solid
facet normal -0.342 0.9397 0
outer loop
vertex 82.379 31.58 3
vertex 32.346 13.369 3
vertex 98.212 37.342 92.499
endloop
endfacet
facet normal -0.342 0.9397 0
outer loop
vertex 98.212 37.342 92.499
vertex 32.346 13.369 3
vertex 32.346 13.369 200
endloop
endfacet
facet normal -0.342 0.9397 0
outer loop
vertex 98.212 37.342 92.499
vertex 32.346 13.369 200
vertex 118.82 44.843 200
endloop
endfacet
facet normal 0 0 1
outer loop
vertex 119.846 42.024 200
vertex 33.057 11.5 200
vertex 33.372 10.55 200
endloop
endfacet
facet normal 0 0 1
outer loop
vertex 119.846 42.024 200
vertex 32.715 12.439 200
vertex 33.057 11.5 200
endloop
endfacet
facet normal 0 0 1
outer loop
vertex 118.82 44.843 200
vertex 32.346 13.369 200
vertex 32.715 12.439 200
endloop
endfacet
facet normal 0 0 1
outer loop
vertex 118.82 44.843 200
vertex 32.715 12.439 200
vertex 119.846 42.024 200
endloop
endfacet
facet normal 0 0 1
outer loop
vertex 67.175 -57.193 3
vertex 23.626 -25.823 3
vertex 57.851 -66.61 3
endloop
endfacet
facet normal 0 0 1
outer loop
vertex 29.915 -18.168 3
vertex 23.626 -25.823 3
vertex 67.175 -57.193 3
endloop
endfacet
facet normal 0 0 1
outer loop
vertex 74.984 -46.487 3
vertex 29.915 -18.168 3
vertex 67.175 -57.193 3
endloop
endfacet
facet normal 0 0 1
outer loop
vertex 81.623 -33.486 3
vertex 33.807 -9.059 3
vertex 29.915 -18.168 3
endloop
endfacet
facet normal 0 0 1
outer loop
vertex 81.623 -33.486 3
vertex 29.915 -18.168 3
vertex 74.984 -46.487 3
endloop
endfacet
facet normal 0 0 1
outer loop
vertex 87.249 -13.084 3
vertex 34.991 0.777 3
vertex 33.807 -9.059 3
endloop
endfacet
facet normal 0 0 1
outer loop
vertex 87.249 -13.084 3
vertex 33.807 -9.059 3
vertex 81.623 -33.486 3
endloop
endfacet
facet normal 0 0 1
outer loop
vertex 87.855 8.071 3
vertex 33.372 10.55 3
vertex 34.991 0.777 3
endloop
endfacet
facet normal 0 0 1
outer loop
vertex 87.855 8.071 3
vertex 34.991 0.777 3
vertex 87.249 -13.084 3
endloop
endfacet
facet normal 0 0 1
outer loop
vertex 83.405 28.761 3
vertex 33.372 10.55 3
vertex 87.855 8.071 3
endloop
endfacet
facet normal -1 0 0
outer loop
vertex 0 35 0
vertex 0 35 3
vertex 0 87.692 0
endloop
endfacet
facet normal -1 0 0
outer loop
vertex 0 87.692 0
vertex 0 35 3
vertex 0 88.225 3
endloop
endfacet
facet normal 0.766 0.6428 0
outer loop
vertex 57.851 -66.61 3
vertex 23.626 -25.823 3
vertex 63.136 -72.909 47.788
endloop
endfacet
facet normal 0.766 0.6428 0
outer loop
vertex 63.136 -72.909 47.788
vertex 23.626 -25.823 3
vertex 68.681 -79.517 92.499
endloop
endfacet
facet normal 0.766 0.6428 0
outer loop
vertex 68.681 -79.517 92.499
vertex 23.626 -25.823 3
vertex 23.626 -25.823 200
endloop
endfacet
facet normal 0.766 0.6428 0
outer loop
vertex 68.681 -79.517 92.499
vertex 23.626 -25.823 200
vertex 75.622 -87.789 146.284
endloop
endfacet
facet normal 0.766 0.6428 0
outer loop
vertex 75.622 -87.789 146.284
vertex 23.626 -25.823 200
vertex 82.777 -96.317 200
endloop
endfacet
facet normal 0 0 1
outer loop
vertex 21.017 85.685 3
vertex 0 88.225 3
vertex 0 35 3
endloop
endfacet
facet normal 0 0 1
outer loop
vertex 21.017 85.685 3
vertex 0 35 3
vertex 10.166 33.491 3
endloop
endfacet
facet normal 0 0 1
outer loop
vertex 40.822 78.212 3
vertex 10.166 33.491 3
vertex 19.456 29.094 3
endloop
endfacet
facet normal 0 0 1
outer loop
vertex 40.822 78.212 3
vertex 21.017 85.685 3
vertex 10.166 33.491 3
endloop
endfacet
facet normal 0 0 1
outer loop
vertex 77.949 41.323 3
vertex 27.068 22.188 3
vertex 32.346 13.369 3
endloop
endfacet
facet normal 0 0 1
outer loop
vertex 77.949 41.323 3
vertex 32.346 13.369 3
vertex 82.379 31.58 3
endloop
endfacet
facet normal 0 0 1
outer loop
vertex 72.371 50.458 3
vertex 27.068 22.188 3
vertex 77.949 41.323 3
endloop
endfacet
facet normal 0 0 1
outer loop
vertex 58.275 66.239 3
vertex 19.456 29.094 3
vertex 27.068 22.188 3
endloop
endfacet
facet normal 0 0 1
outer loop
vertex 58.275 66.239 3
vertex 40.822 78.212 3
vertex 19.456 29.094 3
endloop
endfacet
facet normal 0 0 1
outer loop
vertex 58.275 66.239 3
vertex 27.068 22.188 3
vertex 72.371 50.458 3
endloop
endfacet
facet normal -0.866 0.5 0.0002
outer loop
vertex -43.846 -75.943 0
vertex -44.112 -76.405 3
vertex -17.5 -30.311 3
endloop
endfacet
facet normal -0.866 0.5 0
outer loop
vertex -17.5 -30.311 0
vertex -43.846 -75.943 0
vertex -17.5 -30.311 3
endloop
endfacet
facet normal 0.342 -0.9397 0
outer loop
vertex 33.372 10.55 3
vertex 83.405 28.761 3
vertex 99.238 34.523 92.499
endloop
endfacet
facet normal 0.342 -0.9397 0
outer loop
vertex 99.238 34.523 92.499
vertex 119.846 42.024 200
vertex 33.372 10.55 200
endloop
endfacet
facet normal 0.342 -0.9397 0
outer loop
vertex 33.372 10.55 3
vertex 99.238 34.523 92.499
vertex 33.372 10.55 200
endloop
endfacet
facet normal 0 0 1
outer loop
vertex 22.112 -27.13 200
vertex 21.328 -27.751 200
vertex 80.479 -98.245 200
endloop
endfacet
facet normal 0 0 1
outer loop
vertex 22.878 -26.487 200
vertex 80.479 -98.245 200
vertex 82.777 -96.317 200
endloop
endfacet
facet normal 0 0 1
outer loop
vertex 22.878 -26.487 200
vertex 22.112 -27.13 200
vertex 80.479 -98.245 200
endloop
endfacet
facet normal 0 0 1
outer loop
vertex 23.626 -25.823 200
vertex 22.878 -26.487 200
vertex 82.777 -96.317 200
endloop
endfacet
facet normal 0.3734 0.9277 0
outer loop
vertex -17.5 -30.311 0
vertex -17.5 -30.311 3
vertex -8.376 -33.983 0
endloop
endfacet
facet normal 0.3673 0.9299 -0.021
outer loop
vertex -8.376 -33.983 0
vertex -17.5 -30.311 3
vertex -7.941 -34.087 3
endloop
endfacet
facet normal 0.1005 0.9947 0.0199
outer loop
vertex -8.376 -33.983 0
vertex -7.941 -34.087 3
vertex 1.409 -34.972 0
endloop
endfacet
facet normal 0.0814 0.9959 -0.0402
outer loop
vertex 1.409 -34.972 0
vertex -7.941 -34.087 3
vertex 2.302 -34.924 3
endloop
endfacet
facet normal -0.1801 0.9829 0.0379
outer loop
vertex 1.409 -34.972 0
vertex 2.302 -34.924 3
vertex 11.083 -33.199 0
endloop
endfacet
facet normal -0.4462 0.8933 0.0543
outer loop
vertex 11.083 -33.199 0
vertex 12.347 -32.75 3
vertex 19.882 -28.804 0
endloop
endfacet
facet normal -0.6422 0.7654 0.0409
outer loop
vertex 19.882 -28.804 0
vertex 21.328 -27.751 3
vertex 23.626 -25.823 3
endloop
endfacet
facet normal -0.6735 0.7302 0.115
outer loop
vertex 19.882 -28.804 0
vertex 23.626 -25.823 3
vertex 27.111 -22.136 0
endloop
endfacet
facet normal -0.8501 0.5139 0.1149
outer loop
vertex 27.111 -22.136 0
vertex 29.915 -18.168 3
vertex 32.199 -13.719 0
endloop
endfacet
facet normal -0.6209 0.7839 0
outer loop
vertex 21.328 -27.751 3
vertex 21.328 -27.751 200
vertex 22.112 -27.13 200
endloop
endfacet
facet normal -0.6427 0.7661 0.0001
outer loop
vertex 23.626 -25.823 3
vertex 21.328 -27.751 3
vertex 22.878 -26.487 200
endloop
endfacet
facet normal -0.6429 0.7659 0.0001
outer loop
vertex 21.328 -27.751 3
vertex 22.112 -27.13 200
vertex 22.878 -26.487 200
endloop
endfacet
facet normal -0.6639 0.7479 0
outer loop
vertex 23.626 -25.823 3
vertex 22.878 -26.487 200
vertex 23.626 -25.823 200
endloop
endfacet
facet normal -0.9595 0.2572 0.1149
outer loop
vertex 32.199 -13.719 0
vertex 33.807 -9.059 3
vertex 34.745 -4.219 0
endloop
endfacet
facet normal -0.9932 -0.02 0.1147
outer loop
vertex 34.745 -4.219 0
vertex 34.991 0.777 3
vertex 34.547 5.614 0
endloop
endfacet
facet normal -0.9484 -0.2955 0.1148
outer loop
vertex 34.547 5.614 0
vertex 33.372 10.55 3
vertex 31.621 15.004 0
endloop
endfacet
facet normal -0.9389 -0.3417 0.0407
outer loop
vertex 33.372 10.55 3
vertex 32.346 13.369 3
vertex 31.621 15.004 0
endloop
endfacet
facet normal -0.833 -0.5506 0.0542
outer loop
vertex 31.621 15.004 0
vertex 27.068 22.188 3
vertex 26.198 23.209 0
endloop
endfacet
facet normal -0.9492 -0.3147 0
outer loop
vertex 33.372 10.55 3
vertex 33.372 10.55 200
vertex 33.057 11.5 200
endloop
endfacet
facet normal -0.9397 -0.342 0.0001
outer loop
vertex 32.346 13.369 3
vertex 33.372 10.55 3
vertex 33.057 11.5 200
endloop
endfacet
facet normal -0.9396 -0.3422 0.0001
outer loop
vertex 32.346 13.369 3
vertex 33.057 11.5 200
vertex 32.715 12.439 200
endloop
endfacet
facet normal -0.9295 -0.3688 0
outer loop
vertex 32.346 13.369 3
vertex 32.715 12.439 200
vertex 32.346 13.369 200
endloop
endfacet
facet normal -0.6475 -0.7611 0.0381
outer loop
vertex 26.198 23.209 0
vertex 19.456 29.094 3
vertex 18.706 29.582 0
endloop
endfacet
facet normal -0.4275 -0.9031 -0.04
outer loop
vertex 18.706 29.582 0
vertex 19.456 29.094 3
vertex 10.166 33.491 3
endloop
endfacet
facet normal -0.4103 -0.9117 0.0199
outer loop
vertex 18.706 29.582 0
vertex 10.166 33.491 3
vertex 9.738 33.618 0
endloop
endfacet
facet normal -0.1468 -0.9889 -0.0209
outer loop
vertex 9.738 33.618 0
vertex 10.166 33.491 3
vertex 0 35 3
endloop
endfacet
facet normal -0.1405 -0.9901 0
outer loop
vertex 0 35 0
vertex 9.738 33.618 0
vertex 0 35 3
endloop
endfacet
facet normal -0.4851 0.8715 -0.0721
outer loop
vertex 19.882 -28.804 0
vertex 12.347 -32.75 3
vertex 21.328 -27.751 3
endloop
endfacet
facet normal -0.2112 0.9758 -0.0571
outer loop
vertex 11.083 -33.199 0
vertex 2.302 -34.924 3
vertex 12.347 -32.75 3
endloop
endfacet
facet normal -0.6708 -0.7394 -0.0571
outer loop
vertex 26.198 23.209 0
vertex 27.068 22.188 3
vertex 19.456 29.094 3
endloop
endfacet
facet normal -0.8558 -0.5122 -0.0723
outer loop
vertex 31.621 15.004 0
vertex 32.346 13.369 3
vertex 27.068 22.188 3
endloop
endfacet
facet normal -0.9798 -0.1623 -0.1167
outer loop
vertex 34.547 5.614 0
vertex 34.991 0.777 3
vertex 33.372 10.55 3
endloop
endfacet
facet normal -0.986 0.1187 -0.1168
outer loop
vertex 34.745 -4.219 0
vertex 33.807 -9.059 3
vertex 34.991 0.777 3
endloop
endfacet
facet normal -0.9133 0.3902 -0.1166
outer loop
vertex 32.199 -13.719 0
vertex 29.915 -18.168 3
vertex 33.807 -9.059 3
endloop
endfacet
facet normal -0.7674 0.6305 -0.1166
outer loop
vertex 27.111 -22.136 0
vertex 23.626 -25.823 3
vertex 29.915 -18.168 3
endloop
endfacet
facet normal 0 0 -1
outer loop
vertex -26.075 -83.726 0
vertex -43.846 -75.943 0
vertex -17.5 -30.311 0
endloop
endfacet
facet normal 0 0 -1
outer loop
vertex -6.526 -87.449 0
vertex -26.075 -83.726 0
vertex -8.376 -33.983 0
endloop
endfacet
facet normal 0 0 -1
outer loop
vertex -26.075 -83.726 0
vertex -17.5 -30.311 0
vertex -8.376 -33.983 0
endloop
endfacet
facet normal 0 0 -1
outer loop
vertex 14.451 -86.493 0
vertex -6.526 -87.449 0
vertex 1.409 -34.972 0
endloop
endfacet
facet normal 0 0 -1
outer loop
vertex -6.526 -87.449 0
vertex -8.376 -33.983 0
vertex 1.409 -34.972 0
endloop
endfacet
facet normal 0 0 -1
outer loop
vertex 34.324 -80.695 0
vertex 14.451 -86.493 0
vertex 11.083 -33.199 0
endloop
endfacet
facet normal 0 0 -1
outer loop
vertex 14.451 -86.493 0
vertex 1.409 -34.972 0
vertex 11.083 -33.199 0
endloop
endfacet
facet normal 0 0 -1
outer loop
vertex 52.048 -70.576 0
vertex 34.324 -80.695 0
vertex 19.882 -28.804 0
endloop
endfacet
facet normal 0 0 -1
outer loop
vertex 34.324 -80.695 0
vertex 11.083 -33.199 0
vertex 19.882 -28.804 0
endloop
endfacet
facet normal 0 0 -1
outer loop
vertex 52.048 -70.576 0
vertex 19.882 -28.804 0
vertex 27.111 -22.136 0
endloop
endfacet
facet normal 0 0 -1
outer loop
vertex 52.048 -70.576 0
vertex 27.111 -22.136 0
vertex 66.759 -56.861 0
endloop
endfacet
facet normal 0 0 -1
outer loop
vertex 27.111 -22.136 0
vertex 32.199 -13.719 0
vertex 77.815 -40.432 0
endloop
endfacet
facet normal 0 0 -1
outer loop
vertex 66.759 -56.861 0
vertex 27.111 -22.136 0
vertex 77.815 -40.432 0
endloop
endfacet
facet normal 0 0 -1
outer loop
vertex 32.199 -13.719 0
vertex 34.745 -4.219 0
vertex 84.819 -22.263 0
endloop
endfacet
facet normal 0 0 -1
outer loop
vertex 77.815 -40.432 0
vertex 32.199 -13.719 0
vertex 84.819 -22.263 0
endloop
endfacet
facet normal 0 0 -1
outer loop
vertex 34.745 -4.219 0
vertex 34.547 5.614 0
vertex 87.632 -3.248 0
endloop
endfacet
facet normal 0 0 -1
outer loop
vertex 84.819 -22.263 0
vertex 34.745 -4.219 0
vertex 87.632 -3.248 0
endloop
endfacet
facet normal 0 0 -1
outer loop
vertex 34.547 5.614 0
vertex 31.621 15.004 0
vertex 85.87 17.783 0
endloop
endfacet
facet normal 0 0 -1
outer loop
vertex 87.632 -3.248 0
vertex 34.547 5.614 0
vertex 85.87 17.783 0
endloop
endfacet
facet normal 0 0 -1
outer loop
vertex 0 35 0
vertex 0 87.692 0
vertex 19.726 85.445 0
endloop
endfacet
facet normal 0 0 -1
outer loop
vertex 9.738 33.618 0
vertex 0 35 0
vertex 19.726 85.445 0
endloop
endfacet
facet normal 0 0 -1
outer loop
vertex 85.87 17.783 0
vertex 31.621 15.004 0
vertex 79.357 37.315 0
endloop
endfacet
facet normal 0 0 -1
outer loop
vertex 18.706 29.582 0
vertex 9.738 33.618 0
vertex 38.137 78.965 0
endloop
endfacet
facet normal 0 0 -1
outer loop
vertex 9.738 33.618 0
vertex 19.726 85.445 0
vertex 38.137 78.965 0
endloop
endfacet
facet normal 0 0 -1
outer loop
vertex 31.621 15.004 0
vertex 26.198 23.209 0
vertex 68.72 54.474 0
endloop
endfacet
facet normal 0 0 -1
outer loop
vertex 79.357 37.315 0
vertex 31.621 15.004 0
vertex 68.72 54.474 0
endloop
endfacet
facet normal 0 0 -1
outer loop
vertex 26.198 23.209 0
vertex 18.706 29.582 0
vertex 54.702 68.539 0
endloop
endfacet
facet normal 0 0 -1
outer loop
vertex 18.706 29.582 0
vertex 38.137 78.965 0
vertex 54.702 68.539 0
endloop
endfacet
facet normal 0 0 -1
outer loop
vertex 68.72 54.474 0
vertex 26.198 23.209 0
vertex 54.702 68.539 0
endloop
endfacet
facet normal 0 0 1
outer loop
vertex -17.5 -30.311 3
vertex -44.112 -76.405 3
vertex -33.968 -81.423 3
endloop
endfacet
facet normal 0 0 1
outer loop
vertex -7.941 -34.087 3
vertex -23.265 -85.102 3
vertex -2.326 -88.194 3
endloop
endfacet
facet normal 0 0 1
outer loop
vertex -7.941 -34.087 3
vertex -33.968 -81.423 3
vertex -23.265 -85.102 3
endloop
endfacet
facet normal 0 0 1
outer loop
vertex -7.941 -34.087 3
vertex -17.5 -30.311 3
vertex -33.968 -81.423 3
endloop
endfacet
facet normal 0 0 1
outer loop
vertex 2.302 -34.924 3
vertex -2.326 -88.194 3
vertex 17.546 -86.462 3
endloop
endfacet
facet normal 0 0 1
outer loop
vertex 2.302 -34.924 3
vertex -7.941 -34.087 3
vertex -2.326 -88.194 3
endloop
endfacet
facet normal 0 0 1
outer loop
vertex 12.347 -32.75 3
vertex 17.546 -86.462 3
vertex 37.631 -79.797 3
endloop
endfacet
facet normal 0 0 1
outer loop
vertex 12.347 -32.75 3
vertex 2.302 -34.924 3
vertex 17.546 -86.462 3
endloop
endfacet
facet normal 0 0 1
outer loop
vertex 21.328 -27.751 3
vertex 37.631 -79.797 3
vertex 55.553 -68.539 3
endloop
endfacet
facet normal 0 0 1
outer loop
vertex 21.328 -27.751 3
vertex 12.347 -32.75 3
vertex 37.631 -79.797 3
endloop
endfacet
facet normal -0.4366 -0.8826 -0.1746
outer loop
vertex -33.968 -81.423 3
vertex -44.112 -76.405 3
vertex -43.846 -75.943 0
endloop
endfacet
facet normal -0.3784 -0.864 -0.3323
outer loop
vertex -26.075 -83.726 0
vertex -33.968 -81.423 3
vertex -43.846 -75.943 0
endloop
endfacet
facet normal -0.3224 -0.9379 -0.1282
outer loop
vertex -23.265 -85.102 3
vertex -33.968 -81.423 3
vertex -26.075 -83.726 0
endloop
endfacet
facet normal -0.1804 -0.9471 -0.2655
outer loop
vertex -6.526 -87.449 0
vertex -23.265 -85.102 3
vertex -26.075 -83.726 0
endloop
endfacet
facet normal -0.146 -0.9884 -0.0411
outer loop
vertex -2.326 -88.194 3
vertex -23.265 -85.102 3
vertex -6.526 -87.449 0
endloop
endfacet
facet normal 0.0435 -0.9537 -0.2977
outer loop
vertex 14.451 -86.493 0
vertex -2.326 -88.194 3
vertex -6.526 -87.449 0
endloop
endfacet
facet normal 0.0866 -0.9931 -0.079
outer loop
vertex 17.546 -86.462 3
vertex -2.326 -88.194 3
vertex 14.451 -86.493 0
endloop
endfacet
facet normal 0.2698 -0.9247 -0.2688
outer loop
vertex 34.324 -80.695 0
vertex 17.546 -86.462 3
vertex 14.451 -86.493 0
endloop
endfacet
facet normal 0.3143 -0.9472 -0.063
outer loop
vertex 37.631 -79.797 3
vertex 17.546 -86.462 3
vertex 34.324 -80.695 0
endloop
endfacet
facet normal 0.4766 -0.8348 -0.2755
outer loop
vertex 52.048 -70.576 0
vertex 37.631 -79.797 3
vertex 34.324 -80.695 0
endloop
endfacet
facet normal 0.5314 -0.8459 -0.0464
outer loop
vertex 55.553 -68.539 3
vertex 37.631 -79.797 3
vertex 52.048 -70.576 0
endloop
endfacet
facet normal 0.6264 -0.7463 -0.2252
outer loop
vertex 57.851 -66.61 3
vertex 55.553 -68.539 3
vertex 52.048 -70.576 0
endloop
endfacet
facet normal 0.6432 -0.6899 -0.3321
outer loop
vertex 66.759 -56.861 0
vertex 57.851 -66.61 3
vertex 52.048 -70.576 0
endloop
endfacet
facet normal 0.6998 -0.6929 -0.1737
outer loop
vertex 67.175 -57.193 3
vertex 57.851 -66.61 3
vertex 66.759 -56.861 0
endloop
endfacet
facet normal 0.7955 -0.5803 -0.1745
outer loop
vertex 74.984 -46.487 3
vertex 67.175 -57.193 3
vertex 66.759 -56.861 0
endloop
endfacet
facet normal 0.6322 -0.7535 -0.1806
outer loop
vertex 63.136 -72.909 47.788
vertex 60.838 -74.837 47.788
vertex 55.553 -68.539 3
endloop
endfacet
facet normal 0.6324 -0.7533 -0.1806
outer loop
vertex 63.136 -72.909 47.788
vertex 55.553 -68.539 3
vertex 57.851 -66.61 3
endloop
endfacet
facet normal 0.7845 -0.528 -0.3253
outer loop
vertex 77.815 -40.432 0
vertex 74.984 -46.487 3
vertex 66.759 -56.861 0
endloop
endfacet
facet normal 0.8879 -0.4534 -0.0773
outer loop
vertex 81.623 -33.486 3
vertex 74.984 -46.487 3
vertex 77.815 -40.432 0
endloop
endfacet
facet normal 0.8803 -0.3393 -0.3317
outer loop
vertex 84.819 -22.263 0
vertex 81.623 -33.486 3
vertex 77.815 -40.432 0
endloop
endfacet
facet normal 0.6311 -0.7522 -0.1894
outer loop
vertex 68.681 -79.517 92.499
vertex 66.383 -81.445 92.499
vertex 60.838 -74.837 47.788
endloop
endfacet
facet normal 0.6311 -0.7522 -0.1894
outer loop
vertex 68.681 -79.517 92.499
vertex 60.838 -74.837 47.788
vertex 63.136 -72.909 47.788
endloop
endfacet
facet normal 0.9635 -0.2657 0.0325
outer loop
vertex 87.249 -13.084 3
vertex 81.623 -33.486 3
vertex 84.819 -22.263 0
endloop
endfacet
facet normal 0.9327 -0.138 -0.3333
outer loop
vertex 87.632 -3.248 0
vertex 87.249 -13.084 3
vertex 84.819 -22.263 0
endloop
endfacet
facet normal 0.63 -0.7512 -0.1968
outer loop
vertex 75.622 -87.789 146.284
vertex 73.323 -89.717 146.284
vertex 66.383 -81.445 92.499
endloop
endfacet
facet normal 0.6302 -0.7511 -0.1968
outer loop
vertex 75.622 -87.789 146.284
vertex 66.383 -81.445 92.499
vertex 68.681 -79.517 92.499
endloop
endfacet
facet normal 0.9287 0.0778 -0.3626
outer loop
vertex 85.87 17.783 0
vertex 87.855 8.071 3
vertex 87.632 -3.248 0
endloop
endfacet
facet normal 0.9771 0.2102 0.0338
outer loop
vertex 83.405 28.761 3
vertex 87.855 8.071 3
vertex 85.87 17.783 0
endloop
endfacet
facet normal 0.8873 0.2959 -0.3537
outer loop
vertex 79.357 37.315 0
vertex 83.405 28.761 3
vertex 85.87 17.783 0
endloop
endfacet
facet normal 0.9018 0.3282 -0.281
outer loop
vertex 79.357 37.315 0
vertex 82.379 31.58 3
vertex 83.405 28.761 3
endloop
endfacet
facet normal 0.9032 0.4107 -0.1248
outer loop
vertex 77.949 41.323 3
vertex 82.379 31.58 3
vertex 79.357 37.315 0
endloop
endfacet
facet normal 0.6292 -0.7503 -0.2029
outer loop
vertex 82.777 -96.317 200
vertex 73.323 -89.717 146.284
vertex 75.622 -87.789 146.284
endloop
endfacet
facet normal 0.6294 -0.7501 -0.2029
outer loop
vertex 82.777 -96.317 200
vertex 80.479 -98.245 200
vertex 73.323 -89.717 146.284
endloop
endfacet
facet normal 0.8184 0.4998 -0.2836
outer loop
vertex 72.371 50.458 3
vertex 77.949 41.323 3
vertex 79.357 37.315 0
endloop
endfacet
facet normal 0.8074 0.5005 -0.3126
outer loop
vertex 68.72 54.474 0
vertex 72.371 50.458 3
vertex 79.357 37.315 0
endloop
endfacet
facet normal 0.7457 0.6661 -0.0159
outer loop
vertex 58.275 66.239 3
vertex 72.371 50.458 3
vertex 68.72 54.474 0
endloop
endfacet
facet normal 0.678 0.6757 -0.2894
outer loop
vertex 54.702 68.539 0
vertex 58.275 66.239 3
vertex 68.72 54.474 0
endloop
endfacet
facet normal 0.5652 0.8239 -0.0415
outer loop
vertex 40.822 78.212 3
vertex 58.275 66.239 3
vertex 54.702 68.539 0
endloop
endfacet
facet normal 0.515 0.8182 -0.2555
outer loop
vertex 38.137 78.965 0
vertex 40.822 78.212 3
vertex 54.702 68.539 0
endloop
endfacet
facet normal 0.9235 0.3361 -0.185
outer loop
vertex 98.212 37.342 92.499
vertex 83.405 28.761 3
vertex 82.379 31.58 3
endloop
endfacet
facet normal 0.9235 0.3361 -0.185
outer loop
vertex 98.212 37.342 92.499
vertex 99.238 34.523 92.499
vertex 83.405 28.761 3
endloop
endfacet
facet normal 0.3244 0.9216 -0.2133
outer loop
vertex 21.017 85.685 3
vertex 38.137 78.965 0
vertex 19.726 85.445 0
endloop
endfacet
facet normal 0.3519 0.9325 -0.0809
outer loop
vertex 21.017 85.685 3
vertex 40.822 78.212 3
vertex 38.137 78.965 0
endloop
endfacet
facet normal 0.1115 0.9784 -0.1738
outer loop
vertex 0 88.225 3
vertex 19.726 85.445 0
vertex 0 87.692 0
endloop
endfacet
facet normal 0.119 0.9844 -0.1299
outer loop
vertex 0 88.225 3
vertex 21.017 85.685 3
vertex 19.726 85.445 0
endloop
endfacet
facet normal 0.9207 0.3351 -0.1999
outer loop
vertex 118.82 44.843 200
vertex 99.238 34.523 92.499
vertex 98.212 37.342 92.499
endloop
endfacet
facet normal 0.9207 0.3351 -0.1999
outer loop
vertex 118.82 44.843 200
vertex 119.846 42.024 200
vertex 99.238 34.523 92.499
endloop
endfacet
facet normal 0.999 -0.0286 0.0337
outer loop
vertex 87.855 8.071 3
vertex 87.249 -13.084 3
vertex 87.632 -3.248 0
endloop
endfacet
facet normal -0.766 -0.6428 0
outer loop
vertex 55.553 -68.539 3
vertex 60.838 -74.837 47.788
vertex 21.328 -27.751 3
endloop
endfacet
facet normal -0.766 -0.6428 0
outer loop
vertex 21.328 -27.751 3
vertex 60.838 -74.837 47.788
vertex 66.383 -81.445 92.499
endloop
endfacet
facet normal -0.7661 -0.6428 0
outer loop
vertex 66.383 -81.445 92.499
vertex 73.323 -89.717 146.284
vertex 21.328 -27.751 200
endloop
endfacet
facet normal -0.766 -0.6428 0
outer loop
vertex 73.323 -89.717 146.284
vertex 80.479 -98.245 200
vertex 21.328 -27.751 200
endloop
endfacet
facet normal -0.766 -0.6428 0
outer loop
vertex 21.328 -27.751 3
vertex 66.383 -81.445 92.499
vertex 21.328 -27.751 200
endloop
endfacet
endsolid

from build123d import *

# Parameters (mm, degrees)
SKETCH3_R          = 35
CUT_EXTRUDE2_DEPTH = 285
CUT_EXTRUDE3_DEPTH = 197


with BuildPart() as part:
    # Loft1: read off the stored shape, not the designer's step
    # Loft1: loft between two sections, ruled curve by curve
    loft1_from = [
        Edge.make_bspline([(-87.451090027, 6.495669107, 0), (-100.442428241, -168.406510946, 0), (74.459751812, -181.397849161, 0), (87.451090027, -6.495669107, 0), (100.442428241, 168.406510946, 0), (-74.459751812, 181.397849161, 0), (-87.451090027, 6.495669107, 0)], [0, 0, 0, 0, 0.5, 0.5, 0.5, 1, 1, 1, 1], 3, [1, 0.333333333, 0.333333333, 1, 0.333333333, 0.333333333, 1]),
    ]
    loft1_to = [
        Edge.make_bspline([(-125.095140395, -21.913599651, 200), (-81.267941093, -272.10388044, 200), (168.922339696, -228.276681139, 200), (125.095140395, 21.913599651, 200), (81.267941093, 272.10388044, 200), (-168.922339696, 228.276681139, 200), (-125.095140395, -21.913599651, 200)], [0, 0, 0, 0, 0.5, 0.5, 0.5, 1, 1, 1, 1], 3, [1, 0.333333333, 0.333333333, 1, 0.333333333, 0.333333333, 1]),
    ]
    loft1 = Solid(Shell([*[Face.make_surface_from_curves(loft1_from[k], loft1_to[k]) for k in range(1)], Face(Wire(loft1_from)), Face(Wire(loft1_to))]))
    add(loft1)

    # Sketch3 → Cut-Extrude2 (cut)
    with BuildSketch(Plane.XY.offset(200)):
        Circle(SKETCH3_R)
        with BuildLine():
            ThreePointArc((-17.5, -30.310889132), (-33.80740392, 9.058666579), (0, 35))
            Line((0, 35), (0, 127))
            ThreePointArc((0, 127), (-97.242036064, 81.688349366), (-125.095140395, -21.913599651))
            ThreePointArc((-125.095140395, -21.913599651), (-104.072977278, -72.786093456), (-63.5, -109.985226281))
            Line((-63.5, -109.985226281), (-17.5, -30.310889132))
        make_face()
    extrude(amount=-CUT_EXTRUDE2_DEPTH, mode=Mode.SUBTRACT)

    # Sketch4 → Cut-Extrude3 (cut)
    with BuildSketch(Plane.XY.offset(200)):
        with BuildLine():
            Line((0, 127), (0, 35))
            ThreePointArc((0, 35), (19.456058328, 29.09401647), (32.345993225, 13.36924539))
            Line((32.345993225, 13.36924539), (118.819608286, 44.843067322))
            ThreePointArc((118.819608286, 44.843067322), (72.228562391, 104.460685308), (0, 127))
        make_face()
        with BuildLine():
            Line((119.845668716, 42.02398946), (33.372053655, 10.550167528))
            ThreePointArc((33.372053655, 10.550167528), (33.80740392, -9.058666579), (23.625962477, -25.822739921))
            Line((23.625962477, -25.822739921), (82.777398912, -96.316676798))
            ThreePointArc((82.777398912, -96.316676798), (122.672579939, -32.870018728), (119.845668716, 42.02398946))
        make_face()
        with BuildLine():
            Line((80.479265582, -98.245039627), (21.327829148, -27.75110275))
            ThreePointArc((21.327829148, -27.75110275), (2.302432535, -34.924186525), (-17.5, -30.310889132))
            Line((-17.5, -30.310889132), (-63.5, -109.985226281))
            ThreePointArc((-63.5, -109.985226281), (10.321427256, -126.579888369), (80.479265582, -98.245039627))
        make_face()
    extrude(amount=-CUT_EXTRUDE3_DEPTH, mode=Mode.SUBTRACT)


solid = part.part
